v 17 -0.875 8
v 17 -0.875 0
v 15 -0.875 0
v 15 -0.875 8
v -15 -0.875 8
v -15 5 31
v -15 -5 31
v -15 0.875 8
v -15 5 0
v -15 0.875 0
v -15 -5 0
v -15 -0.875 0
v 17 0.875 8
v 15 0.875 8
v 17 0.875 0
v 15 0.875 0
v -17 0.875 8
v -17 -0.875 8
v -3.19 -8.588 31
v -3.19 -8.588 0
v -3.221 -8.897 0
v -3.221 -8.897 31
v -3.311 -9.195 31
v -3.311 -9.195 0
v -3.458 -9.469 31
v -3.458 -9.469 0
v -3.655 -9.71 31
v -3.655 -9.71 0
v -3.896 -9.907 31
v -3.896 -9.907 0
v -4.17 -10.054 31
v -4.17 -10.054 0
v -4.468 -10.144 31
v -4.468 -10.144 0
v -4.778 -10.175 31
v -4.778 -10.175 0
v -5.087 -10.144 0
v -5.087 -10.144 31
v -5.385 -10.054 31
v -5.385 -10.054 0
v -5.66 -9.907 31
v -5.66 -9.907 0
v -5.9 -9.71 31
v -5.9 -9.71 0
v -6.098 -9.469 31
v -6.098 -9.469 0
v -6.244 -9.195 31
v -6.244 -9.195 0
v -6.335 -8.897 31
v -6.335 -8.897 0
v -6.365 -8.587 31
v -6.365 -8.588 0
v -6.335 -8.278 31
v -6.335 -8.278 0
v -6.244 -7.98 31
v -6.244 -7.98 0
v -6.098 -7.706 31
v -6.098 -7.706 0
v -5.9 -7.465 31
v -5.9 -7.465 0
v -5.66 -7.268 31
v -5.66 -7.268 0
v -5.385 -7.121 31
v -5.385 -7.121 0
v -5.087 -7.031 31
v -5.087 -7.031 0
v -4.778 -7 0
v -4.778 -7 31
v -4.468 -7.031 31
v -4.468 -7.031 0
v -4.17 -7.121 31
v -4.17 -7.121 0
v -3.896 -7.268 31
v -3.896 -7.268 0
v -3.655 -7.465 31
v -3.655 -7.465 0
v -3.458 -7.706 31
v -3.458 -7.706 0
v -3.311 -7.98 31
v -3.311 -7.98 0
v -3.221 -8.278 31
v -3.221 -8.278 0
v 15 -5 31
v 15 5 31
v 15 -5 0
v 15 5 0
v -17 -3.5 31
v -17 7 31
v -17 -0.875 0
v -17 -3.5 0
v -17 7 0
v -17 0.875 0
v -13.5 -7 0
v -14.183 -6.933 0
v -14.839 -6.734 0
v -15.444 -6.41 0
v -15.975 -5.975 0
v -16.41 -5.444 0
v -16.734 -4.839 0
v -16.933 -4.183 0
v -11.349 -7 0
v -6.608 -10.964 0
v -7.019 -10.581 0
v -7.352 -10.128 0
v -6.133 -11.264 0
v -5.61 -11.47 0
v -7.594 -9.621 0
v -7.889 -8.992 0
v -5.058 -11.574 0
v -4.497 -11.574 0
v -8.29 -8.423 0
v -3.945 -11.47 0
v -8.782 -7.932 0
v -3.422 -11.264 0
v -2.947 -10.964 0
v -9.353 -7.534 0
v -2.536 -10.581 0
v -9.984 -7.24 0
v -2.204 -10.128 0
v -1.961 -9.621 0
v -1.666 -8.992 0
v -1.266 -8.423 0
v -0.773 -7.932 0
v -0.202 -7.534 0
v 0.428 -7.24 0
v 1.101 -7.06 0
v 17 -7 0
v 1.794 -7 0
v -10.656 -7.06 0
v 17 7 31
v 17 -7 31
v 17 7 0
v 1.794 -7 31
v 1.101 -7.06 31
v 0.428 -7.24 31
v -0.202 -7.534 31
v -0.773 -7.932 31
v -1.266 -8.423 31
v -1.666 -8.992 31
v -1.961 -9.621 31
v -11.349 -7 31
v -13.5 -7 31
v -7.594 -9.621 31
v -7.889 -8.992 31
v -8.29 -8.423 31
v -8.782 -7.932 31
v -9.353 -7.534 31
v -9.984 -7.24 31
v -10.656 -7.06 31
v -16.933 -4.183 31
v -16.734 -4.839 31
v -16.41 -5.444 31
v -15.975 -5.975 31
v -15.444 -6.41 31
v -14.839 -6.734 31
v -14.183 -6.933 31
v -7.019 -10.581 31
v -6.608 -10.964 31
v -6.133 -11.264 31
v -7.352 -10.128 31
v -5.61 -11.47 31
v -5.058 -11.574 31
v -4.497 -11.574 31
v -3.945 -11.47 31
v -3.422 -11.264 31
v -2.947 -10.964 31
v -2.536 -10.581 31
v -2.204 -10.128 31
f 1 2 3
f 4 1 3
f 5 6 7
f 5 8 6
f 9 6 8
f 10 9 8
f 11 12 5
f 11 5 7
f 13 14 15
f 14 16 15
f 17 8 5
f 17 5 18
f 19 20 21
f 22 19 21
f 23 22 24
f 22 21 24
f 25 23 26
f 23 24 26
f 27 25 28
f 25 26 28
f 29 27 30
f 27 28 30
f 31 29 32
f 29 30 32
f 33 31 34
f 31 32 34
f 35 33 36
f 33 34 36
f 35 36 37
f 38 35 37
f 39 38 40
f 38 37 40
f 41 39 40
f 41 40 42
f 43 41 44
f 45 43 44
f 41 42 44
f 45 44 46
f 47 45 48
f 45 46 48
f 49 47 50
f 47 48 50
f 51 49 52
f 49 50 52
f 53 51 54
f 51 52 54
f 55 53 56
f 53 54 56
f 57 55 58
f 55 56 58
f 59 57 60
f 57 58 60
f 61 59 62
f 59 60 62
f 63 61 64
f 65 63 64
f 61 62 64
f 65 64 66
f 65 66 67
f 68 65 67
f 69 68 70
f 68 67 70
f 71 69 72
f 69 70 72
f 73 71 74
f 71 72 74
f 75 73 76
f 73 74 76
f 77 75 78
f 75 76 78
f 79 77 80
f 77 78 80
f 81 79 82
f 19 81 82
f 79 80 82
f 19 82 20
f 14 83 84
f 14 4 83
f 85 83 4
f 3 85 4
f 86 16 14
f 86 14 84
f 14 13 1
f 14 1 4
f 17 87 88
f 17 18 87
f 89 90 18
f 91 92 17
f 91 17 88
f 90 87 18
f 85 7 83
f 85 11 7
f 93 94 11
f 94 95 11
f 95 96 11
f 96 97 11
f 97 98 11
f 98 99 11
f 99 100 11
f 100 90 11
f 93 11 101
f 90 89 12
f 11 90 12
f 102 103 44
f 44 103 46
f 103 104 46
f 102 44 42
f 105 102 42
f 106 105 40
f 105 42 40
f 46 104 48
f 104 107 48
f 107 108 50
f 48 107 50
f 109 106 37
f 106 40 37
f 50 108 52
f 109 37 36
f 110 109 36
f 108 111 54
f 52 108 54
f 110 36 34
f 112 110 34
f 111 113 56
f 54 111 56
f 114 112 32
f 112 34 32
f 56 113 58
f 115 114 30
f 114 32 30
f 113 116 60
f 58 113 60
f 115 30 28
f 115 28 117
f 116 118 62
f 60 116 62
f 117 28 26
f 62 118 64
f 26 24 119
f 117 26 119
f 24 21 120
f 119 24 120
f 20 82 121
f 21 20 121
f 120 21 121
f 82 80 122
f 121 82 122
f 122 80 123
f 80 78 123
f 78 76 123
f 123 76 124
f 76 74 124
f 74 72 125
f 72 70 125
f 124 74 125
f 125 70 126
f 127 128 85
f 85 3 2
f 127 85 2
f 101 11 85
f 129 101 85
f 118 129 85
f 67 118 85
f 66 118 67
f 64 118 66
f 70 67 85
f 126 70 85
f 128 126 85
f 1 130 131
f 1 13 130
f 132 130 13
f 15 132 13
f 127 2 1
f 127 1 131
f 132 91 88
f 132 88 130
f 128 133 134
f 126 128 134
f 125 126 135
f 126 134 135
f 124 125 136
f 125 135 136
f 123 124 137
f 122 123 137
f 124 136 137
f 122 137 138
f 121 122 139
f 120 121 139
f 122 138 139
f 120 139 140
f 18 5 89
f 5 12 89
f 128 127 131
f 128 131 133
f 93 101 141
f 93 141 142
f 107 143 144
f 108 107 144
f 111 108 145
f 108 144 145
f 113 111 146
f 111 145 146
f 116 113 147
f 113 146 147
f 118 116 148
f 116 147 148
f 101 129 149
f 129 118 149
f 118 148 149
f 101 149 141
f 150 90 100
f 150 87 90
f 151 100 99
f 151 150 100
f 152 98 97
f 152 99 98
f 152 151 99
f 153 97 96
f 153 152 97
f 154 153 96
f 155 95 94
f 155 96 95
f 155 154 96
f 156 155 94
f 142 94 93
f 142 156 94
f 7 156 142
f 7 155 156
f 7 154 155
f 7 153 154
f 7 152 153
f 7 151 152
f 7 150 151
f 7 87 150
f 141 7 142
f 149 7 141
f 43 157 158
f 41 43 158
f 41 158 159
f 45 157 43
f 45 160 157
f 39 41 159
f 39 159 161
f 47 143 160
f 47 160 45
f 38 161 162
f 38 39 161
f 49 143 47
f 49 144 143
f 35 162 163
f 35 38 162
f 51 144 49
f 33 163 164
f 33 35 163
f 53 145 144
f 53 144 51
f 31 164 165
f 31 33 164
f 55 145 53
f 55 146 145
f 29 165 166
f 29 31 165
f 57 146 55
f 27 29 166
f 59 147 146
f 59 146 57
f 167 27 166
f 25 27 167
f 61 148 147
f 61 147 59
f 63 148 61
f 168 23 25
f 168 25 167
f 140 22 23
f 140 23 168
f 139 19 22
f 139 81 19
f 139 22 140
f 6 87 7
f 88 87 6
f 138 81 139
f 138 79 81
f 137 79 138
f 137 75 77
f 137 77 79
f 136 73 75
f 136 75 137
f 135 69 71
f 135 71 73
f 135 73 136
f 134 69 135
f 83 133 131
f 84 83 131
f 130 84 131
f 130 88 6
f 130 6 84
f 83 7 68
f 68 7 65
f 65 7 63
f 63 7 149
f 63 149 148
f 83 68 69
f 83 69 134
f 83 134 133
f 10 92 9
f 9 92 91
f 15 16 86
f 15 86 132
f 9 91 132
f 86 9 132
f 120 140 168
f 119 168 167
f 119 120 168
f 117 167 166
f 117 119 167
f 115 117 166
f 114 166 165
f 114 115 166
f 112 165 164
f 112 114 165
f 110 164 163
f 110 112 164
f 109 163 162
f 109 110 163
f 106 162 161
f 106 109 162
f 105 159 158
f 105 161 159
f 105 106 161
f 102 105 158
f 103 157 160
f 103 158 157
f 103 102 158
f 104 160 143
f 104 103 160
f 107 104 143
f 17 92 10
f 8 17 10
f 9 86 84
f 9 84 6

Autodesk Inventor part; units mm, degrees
ref_plane "YZ Plane" through (0, 0, 0) normal (1, 0, 0) x (0, 1, 0)
ref_plane "XZ Plane" through (0, 0, 0) normal (0, 1, 0) x (-1, 0, 0)
ref_plane "XY Plane" through (0, 0, 0) normal (0, 0, 1) x (1, 0, 0)
sketch "Sketch1" plane through (0, 0, 0) normal (0, 0, 1) x (1, 0, 0)
  line L0 (-15, -5) -> (15, -5)
  line L1 (15, -5) -> (15, 5)
  line L2 (15, 5) -> (-15, 5)
  line L3 (-15, 5) -> (-15, -5)
  line L4 (-15, -5) -> (15, 5) construction
  line L5 (15, -5) -> (-15, 5) construction
  line L6 (-17, 7) -> (17, 7)
  line L7 (17, 7) -> (17, -7)
  line L8 (17, -7) -> (-17, -7)
  line L9 (-17, -7) -> (-17, 7)
  line L10 (-15, 0) -> (-8.5, 0) construction
  line L11 (-8.5, 0) -> (-4.7776, -8.5875) construction
  circle A0 centre (-13.2482, 10.9542) radius 1.5875
  circle A1 centre (-13.2482, 10.9542) radius 3
  line L12 (-13.2482, 10.9542) -> (-19.3708, 3.6576) construction
  line L13 (-19.3708, 3.6576) -> (-4.7776, -8.5875) construction
  circle A2 centre (-4.7776, -8.5875) radius 1.5875
  circle A3 centre (-4.7776, -8.5875) radius 3
  point P0 (0, 0)
  point P1 (-2.2321, -7)
  point P2 (-9.2647, 7)
  point P3 (-13.8861, 7)
  point P4 (-7.3232, -7)
  dimension "d0" = 10
  dimension "d1" = 30
  dimension "d2" = 2
  dimension "d3" = 6.5
  dimension "d8" = 3.175
  dimension "d9" = 6
  dimension "d10" = 9.525
  dimension "d11" = 19.05
  dimension "d12" = 3.175
  dimension "d13" = 6
  dimension "d14" = 40
extrude "Extrusion1" add sketch "Sketch1" along normal blind 31 contours L6 L7 L8 A3 L9 | A3 L8 | L8 A3
fillet "Fillet1" radius 4 2 edges at (-2.2321, -7, 15.5) (-7.3232, -7, 15.5)
sketch "Sketch2" plane through (0, 0, 0) normal (0, 0, -1) x (-1, 0, 0)
  line L0 (-22.5, -0.875) -> (22.5, -0.875)
  line L1 (22.5, -0.875) -> (22.5, 0.875)
  line L2 (22.5, 0.875) -> (-22.5, 0.875)
  line L3 (-22.5, 0.875) -> (-22.5, -0.875)
  line L4 (-22.5, -0.875) -> (22.5, 0.875) construction
  line L5 (22.5, -0.875) -> (-22.5, 0.875) construction
  point P0 (0, 0)
  dimension "d18" = 45
  dimension "d19" = 1.75
extrude "Extrusion2" cut sketch "Sketch2" against normal blind 8
fillet "Fillet2" radius 3.5 1 edges at (-17, -7, 15.5)
properties part number "Sleeve" material "Nylon 6/6"
